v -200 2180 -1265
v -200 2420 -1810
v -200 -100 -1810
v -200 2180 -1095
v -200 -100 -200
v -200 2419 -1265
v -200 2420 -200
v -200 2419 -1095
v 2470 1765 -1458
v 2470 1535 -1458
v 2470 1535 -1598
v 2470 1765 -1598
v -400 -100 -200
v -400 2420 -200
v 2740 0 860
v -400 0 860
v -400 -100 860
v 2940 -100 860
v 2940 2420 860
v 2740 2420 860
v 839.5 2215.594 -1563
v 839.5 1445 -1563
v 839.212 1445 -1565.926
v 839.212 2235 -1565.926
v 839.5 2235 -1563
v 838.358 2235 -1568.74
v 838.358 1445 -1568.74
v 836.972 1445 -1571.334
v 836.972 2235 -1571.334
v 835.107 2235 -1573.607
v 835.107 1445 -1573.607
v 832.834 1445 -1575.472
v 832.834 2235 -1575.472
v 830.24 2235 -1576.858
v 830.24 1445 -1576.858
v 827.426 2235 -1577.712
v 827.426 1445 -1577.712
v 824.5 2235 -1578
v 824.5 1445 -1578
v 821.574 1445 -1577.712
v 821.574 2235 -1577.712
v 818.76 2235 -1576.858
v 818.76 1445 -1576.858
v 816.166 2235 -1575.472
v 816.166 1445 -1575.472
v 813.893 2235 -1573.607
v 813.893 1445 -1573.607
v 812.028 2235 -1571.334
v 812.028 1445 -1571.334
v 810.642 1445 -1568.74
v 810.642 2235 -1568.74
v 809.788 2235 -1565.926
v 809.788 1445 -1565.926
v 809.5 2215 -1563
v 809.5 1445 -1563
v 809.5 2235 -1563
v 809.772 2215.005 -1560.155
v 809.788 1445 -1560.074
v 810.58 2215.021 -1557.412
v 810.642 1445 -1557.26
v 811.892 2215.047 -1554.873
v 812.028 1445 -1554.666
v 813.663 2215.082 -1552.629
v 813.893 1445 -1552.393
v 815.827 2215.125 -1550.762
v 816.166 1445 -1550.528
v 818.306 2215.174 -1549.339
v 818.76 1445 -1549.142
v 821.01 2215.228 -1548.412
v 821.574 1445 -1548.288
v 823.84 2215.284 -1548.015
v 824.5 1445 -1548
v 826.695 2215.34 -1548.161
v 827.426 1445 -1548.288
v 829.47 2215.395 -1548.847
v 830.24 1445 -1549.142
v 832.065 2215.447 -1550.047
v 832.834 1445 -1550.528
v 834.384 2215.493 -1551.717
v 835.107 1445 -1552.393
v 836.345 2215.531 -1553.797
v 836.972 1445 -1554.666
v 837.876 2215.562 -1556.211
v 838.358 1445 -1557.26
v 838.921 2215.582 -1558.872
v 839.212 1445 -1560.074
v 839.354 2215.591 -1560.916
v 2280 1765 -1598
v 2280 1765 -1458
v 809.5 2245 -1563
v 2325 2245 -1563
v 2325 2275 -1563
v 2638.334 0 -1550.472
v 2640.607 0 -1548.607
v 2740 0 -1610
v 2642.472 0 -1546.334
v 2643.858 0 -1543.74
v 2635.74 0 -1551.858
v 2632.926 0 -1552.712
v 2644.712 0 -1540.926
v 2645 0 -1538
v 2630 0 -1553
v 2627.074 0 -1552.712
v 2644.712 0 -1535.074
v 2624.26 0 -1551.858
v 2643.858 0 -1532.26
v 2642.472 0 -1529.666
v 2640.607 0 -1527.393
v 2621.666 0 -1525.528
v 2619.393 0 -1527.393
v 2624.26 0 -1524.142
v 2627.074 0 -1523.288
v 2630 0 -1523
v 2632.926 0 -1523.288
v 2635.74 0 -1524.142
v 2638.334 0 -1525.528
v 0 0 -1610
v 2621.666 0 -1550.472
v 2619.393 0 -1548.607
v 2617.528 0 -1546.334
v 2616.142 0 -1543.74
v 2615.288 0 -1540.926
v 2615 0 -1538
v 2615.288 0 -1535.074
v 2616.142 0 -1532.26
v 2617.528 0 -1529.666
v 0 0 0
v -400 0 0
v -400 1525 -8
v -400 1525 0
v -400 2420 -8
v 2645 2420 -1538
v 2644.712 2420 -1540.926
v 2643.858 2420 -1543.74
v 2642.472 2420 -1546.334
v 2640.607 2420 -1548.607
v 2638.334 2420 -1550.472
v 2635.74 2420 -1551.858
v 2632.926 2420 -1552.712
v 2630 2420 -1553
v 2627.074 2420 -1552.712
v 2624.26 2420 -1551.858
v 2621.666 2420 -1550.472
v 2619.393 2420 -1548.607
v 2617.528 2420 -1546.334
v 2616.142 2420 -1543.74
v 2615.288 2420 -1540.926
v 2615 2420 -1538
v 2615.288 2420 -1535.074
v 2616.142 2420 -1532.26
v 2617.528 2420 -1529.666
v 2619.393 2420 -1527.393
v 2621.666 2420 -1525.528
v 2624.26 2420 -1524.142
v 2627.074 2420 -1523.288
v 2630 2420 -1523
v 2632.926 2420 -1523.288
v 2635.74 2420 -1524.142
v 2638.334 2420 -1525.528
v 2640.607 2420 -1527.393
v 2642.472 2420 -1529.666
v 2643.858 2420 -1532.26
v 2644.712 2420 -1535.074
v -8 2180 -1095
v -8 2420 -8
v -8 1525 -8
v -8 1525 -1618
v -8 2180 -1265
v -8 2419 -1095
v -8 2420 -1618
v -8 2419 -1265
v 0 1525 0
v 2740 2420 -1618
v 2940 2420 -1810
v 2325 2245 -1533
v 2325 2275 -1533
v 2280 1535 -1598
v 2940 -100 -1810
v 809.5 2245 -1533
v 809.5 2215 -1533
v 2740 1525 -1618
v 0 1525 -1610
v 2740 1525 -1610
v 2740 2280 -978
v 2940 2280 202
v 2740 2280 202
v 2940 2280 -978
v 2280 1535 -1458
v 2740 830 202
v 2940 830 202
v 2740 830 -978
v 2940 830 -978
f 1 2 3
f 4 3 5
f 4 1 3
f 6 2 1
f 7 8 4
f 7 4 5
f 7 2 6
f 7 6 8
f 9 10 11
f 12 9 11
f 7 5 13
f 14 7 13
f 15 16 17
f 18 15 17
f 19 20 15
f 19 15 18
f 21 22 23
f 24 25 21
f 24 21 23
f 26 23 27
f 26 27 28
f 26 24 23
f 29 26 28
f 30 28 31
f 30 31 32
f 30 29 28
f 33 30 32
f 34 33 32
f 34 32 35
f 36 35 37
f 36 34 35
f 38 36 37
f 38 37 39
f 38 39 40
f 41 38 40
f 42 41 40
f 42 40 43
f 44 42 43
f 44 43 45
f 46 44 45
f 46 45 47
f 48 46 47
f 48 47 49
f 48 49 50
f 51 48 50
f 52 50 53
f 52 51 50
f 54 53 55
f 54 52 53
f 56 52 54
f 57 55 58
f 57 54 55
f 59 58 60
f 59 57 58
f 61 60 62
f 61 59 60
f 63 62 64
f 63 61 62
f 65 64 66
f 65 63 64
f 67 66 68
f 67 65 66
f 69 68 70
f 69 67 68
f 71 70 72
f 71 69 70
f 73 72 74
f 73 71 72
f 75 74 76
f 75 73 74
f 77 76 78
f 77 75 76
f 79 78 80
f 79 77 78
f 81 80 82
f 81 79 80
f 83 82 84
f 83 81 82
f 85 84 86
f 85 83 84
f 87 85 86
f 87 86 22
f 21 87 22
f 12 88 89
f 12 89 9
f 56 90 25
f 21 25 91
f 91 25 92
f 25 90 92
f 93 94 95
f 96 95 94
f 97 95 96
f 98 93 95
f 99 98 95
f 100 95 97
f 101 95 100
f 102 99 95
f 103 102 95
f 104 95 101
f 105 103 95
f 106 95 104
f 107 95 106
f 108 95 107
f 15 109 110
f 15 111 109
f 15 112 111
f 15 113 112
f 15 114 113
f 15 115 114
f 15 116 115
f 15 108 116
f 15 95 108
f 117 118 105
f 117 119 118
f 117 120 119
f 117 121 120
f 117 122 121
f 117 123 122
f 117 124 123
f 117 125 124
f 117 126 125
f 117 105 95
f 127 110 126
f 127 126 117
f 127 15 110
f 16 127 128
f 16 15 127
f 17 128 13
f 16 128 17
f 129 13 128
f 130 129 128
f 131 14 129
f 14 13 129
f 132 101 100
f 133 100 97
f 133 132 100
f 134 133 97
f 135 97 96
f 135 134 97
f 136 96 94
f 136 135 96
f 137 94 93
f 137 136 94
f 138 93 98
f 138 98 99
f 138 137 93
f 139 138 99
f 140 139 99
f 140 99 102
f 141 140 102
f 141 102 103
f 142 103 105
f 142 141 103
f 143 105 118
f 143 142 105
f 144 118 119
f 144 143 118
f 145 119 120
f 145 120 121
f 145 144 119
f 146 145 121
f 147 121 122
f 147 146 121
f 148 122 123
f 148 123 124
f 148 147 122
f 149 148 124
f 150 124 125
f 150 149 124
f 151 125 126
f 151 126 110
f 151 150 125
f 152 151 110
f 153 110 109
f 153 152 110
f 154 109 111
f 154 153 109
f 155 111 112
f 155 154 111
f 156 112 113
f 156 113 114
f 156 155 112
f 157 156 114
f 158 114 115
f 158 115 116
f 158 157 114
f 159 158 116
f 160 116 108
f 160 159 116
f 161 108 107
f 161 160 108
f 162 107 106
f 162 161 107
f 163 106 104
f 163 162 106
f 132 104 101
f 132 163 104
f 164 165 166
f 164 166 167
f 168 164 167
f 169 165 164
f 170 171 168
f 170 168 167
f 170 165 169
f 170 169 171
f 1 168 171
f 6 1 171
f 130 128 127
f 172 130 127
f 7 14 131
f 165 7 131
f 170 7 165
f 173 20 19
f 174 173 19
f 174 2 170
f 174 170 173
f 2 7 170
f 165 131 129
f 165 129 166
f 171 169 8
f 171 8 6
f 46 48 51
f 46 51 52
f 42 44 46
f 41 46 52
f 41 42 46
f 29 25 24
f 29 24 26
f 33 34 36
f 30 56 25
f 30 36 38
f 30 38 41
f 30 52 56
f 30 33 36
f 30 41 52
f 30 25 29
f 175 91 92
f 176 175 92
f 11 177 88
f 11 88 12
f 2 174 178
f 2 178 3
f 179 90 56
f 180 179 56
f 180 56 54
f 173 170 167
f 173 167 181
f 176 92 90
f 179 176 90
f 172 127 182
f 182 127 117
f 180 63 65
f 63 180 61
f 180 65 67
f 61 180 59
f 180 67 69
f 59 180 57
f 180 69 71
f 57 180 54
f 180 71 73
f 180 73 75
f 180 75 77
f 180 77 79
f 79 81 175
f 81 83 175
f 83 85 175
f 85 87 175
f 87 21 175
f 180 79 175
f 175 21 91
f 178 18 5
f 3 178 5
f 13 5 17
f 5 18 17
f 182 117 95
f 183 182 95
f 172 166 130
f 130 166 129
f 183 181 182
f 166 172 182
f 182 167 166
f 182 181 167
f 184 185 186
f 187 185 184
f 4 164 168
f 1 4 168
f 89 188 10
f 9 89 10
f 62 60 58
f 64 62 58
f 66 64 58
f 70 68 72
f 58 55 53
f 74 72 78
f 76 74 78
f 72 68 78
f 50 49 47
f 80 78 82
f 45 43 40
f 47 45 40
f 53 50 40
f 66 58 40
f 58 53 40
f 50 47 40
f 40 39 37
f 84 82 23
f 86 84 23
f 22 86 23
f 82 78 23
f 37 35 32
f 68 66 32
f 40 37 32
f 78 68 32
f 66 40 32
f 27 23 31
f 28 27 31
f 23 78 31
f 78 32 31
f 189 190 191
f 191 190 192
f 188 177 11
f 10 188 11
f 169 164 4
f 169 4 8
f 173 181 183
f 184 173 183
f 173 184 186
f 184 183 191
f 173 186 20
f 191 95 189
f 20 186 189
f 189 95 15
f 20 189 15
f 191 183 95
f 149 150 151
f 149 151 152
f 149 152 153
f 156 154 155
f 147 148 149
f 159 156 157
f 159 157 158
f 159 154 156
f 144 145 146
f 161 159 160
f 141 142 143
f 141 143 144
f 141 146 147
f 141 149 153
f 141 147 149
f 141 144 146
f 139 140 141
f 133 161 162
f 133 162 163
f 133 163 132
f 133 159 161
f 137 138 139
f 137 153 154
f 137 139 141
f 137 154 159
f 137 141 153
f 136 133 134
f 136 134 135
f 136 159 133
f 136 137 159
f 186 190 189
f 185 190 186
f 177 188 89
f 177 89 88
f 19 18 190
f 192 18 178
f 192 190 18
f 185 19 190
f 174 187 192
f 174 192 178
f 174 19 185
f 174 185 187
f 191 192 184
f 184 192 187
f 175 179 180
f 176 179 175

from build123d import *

# Parameters (mm, degrees)
EXTRUDE_1_DEPTH     = 2420
EXTRUDE_2_DEPTH     = 100
SKETCH_3_W          = 3340
SKETCH_3_H          = 2520
CUT_EXTRUDE_1_DEPTH = 200
SKETCH_4_W          = 170
SKETCH_4_H          = 239
CUT_EXTRUDE_2_DEPTH = 200
CUT_EXTRUDE_3_DEPTH = 895
SKETCH_6_R          = 15
EXTRUDE_3_DEPTH     = 790
SKETCH_7_R          = 15
EXTRUDE_4_DEPTH     = 2420
SKETCH_10_W         = 190
SKETCH_10_H         = 140
EXTRUDE_6_DEPTH     = 230
EXTRUDE_7_DEPTH     = 30
SKETCH_13_W         = 1180
SKETCH_13_H         = 1450
CUT_EXTRUDE_4_DEPTH = 400


with BuildPart() as part:
    # Эскиз1 → Бобышка-Вытянуть1 (new body)
    with BuildSketch(Plane(origin=(0, 0, 0), x_dir=(1, 0, 0), z_dir=(0, 1, 0))):
        Polygon((0, 0), (0, 1610), (2740, 1610), (2740, -860), (-400, -860), (-400, -1060), (2940, -1060), (2940, 1810), (-200, 1810), (-200, 200), (-400, 200), (-400, 0), align=None)
    extrude(amount=EXTRUDE_1_DEPTH)

    # Эскиз2 → Бобышка-Вытянуть2 (add)
    with BuildSketch(Plane.XZ):
        Polygon((-400, 1060), (2940, 1060), (2940, -1810), (-200, -1810), (-200, -200), (-400, -200), align=None)
    extrude(amount=EXTRUDE_2_DEPTH)

    # Эскиз3 → Вырез-Вытянуть1 (cut)
    with BuildSketch(Plane.XY.offset(1060)):
        with Locations((1270, 1160)):
            Rectangle(SKETCH_3_W, SKETCH_3_H)
    extrude(amount=-CUT_EXTRUDE_1_DEPTH, mode=Mode.SUBTRACT)

    # Эскиз4 → Вырез-Вытянуть2 (cut)
    with BuildSketch(Plane(origin=(0, 0, 0), x_dir=(0, 0, -1), z_dir=(1, 0, 0))):
        with Locations((1180, 2299.5)):
            Rectangle(SKETCH_4_W, SKETCH_4_H)
    extrude(amount=-CUT_EXTRUDE_2_DEPTH, mode=Mode.SUBTRACT)

    # Эскиз5 → Вырез-Вытянуть3 (cut)
    with BuildSketch(Plane(origin=(0, 2420, 0), x_dir=(1, 0, 0), z_dir=(0, 1, 0))):
        Polygon((-400, 8), (-8, 8), (-8, 1618), (2740, 1618), (2740, 1610), (0, 1610), (0, 0), (-400, 0), align=None)
    extrude(amount=-CUT_EXTRUDE_3_DEPTH, mode=Mode.SUBTRACT)

    # Эскиз7 → Бобышка-Вытянуть4 (add)
    with BuildSketch(Plane(origin=(0, 2420, 0), x_dir=(1, 0, 0), z_dir=(0, 1, 0))):
        with Locations((2630, 1538)):
            Circle(SKETCH_7_R)
    extrude(amount=-EXTRUDE_4_DEPTH)

    # Эскиз13 → Вырез-Вытянуть4 (cut)
    with BuildSketch(Plane(origin=(2940, 0, 0), x_dir=(0, 0, -1), z_dir=(1, 0, 0))):
        with Locations((388, 1555)):
            Rectangle(SKETCH_13_W, SKETCH_13_H)
    extrude(amount=-CUT_EXTRUDE_4_DEPTH, mode=Mode.SUBTRACT)


with BuildPart() as body_2:
    # Эскиз6 → Бобышка-Вытянуть3 (new body)
    with BuildSketch(Plane(origin=(0, 2235, 0), x_dir=(1, 0, 0), z_dir=(0, 1, 0))):
        with Locations((824.5, 1563)):
            Circle(SKETCH_6_R)
    extrude(amount=-EXTRUDE_3_DEPTH)

    # Эскиз12 → Бобышка-Вытянуть7 (add)
    with BuildSketch(Plane.XY.offset(-1563)):
        Polygon((809.5, 2215), (2325, 2245), (2325, 2275), (809.5, 2245), align=None)
    extrude(amount=EXTRUDE_7_DEPTH)


with BuildPart() as body_3:
    # Эскиз10 → Бобышка-Вытянуть6 (new body)
    with BuildSketch(Plane(origin=(0, 1535, 0), x_dir=(1, 0, 0), z_dir=(0, 1, 0))):
        with Locations((2375, 1528)):
            Rectangle(SKETCH_10_W, SKETCH_10_H)
    extrude(amount=EXTRUDE_6_DEPTH)


solid = Compound([part.part, body_2.part, body_3.part])
